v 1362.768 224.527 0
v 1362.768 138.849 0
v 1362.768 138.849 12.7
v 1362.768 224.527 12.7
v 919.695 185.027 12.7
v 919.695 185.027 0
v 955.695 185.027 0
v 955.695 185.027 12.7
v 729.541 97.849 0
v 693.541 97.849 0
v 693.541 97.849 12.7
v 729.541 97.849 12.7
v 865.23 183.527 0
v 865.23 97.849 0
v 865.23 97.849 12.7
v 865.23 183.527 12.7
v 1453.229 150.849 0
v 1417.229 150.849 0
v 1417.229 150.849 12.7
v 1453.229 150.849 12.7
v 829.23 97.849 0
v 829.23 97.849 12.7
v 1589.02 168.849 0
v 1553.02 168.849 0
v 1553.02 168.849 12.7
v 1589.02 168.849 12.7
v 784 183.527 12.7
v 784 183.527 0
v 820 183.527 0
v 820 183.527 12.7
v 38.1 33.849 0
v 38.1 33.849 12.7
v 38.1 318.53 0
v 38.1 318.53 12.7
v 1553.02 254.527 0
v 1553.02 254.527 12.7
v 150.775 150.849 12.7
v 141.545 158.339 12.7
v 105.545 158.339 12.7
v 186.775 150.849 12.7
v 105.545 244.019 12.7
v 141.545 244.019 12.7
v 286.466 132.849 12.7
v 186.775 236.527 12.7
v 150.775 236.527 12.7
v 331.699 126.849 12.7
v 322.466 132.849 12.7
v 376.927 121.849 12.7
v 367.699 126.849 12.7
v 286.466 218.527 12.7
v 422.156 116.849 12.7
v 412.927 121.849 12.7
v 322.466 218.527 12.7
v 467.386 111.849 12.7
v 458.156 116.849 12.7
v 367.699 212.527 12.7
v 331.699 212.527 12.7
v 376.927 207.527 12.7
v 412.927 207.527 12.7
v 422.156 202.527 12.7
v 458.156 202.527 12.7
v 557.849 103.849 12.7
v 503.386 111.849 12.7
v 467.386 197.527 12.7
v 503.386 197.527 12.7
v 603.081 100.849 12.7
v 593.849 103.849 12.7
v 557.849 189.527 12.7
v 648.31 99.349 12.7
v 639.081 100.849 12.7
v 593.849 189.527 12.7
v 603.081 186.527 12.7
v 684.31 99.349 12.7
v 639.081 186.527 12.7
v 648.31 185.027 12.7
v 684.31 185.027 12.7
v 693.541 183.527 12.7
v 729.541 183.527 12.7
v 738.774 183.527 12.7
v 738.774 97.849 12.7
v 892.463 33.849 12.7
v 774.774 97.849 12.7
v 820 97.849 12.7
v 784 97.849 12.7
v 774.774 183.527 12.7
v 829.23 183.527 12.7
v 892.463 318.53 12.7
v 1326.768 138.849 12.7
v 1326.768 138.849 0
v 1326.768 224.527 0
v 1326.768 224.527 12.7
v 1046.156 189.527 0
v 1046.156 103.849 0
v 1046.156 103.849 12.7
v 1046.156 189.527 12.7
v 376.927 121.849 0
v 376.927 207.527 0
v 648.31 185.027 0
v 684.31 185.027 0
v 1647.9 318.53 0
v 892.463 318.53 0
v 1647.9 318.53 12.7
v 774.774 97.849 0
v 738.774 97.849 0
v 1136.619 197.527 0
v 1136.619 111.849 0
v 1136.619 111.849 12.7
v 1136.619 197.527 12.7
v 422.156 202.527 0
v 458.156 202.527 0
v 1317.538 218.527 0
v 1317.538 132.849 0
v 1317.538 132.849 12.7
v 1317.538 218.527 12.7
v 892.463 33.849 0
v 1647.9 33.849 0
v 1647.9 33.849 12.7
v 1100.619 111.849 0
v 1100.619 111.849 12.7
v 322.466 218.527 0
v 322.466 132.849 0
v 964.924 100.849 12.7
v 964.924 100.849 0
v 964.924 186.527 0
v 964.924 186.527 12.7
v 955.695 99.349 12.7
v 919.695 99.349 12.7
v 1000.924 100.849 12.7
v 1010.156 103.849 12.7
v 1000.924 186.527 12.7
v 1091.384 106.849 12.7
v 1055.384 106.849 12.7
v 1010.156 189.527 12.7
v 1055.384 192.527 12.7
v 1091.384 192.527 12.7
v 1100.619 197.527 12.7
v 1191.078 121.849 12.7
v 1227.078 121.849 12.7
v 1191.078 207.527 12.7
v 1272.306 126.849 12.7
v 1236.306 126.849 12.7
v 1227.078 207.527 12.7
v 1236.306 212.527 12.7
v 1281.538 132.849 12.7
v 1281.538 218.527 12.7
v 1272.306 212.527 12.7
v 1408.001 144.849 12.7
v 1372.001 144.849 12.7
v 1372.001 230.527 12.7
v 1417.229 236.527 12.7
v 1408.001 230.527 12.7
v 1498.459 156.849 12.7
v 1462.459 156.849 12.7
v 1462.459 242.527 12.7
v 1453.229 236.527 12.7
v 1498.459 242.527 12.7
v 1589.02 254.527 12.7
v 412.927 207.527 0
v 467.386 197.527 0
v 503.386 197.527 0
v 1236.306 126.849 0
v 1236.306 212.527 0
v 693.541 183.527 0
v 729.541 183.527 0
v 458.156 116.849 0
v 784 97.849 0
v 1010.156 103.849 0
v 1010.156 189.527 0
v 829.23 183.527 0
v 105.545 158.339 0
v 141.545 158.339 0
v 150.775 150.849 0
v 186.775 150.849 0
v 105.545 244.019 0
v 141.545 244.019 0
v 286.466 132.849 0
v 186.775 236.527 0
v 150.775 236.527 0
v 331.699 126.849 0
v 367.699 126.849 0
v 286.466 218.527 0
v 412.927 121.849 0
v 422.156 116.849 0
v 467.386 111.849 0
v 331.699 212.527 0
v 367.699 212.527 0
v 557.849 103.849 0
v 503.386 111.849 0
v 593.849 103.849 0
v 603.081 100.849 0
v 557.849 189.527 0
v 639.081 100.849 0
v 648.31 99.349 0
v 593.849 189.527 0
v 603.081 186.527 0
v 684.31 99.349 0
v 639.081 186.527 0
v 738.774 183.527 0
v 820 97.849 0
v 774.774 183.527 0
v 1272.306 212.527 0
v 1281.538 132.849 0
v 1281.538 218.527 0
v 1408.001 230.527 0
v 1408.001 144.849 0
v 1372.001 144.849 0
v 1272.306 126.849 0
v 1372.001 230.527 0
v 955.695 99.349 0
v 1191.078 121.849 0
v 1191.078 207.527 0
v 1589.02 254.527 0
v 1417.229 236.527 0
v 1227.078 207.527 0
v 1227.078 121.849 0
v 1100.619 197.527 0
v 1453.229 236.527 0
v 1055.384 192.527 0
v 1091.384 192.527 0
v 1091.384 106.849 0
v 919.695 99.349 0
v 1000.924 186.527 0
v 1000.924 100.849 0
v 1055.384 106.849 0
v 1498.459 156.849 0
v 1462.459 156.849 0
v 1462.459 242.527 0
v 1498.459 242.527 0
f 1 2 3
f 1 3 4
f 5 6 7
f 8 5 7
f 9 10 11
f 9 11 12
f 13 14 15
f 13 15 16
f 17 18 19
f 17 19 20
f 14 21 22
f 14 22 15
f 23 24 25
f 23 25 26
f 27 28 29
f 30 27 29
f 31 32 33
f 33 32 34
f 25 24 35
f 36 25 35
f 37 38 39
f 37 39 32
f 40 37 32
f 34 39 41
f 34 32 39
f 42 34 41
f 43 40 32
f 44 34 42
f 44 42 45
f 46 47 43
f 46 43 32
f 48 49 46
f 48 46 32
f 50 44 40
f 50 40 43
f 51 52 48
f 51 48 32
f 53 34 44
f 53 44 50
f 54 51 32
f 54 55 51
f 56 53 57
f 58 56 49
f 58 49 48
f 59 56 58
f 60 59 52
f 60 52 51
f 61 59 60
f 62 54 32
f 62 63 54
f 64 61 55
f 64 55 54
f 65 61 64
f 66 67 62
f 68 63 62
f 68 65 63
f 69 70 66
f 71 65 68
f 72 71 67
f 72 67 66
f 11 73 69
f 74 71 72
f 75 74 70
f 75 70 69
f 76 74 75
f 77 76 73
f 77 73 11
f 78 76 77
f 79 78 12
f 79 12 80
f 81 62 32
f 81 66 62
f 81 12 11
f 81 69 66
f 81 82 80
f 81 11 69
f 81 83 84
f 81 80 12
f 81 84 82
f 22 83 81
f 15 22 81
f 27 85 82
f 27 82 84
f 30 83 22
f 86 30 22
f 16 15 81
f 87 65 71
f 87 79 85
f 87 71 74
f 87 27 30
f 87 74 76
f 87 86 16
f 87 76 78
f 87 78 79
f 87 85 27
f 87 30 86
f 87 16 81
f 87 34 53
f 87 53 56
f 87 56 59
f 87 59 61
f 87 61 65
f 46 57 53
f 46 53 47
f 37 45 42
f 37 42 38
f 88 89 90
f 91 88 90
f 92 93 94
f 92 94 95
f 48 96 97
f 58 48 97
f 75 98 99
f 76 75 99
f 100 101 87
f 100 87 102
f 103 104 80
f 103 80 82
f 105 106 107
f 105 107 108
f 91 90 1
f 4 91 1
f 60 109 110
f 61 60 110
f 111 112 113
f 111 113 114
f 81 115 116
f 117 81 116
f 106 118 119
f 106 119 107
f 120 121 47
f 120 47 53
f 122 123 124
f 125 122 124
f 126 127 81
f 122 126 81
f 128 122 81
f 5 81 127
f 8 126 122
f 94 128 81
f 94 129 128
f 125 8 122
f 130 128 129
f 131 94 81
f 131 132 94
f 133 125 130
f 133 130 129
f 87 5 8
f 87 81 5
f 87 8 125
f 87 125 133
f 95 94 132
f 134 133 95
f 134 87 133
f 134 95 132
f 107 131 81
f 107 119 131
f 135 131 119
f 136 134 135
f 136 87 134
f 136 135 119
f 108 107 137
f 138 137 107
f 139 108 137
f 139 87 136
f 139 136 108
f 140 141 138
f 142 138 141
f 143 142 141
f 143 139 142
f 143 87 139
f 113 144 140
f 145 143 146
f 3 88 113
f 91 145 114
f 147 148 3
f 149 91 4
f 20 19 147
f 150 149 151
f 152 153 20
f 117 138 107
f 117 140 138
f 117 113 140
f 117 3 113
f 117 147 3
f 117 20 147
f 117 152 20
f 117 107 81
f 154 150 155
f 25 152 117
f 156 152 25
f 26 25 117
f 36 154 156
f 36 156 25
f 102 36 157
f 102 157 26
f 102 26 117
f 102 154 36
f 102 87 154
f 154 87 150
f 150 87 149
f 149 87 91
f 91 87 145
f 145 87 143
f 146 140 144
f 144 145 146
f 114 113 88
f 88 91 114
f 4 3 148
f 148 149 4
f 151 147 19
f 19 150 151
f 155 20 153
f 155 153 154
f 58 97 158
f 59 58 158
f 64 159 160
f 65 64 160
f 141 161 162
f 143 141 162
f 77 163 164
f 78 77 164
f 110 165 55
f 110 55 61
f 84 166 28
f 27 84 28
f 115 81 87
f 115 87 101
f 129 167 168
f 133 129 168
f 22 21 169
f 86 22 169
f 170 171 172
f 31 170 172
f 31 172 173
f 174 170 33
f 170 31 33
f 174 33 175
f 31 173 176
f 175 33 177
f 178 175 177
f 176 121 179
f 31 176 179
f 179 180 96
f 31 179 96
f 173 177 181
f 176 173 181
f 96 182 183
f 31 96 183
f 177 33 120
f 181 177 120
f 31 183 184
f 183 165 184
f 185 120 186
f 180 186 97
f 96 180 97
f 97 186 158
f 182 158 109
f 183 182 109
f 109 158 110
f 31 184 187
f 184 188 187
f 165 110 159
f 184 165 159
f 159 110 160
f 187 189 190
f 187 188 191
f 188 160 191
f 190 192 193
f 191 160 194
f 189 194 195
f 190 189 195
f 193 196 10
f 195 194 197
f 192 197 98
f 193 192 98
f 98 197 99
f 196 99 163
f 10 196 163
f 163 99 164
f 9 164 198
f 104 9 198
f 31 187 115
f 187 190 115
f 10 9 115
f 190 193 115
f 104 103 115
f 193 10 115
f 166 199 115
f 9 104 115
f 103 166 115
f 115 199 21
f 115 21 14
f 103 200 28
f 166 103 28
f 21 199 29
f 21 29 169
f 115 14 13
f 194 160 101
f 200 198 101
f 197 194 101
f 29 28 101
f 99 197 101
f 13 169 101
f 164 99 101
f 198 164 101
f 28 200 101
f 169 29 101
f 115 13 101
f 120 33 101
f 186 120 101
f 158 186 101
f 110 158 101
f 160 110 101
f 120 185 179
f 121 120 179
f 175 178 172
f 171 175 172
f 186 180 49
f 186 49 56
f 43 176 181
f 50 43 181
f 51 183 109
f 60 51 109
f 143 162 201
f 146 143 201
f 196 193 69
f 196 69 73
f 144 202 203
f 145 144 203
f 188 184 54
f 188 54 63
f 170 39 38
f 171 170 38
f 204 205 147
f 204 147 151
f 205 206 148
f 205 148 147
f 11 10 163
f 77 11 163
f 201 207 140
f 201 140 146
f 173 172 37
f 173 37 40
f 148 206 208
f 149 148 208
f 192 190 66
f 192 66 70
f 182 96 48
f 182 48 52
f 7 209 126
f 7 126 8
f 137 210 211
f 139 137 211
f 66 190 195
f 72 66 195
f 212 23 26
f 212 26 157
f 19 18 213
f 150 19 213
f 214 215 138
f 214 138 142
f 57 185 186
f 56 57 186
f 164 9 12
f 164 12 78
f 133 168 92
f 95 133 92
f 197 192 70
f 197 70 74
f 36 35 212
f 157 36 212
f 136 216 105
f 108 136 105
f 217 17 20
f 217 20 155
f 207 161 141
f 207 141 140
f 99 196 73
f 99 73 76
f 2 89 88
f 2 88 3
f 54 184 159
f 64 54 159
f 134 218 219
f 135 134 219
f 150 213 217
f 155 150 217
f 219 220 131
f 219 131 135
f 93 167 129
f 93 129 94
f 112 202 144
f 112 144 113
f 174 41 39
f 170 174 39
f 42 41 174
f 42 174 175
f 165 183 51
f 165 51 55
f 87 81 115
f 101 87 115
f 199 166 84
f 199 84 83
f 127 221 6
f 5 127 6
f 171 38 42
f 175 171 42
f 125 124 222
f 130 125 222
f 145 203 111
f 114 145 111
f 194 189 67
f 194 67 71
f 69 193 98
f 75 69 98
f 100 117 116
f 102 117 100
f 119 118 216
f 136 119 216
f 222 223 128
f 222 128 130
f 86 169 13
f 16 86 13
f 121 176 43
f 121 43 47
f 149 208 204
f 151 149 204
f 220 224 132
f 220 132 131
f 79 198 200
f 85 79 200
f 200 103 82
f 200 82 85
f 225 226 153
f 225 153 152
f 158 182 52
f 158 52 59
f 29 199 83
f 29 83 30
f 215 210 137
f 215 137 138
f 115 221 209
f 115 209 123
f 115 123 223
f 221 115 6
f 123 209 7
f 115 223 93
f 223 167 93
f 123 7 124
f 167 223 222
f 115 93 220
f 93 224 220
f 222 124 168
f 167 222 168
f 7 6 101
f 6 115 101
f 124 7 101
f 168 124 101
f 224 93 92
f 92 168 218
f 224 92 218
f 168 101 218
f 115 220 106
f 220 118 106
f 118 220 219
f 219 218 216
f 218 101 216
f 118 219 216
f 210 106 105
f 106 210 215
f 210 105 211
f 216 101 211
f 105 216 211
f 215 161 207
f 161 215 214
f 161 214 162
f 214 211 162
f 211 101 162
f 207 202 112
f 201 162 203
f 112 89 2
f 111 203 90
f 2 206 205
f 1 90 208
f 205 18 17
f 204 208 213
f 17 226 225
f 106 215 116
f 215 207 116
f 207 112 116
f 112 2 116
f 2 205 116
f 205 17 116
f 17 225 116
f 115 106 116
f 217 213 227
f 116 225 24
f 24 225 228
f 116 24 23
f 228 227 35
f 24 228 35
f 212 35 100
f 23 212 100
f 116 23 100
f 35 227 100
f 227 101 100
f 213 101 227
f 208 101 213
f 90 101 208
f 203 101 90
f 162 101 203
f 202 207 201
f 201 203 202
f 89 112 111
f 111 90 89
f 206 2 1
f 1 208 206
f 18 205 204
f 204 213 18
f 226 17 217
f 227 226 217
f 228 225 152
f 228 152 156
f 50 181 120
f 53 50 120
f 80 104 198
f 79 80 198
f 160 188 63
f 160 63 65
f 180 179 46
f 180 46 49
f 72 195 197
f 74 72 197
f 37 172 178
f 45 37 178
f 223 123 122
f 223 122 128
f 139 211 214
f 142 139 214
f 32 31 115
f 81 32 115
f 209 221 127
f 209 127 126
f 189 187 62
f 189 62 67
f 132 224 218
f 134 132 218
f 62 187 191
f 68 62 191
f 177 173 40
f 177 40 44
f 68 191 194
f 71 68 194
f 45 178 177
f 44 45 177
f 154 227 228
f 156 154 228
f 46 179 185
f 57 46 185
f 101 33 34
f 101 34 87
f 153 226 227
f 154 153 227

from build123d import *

# Parameters (mm, degrees)
SKETCH2_W           = 1647.9
SKETCH2_H           = 284.681734848
SKETCH2_W_2         = 36
SKETCH2_H_2         = 85.677465121
BOSS_EXTRUDE1_DEPTH = 12.7
SKETCH3_W           = 19.05
SKETCH3_H           = 284.681734848
CUT_EXTRUDE1_DEPTH  = 13.7
SKETCH4_W           = 36
SKETCH4_H           = 50.330449982
SKETCH4_H_2         = 35.349550018
CUT_EXTRUDE2_DEPTH  = 13.7


with BuildPart() as part:
    # Sketch2 → Boss-Extrude1 (new body)
    with BuildSketch(Plane.XY):
        with Locations((842.999943303, 176.189566708)):
            Rectangle(SKETCH2_W, SKETCH2_H)
        with Locations((1571.01994314, 211.688120447)):
            Rectangle(SKETCH2_W_2, SKETCH2_H_2, mode=Mode.SUBTRACT)
        with Locations((1480.459247559, 199.688120447)):
            Rectangle(SKETCH2_W_2, SKETCH2_H_2, mode=Mode.SUBTRACT)
        with Locations((1435.229386921, 193.688120447)):
            Rectangle(SKETCH2_W_2, SKETCH2_H_2, mode=Mode.SUBTRACT)
        with Locations((1390.000695887, 187.688120447)):
            Rectangle(SKETCH2_W_2, SKETCH2_H_2, mode=Mode.SUBTRACT)
        with Locations((1344.768303255, 181.688120447)):
            Rectangle(SKETCH2_W_2, SKETCH2_H_2, mode=Mode.SUBTRACT)
        with Locations((1299.538396377, 175.688120447)):
            Rectangle(SKETCH2_W_2, SKETCH2_H_2, mode=Mode.SUBTRACT)
        with Locations((1254.306140471, 169.688120446)):
            Rectangle(SKETCH2_W_2, SKETCH2_H_2, mode=Mode.SUBTRACT)
        with Locations((1209.07770281, 164.688120446)):
            Rectangle(SKETCH2_W_2, SKETCH2_H_2, mode=Mode.SUBTRACT)
        with Locations((1118.618578512, 154.688120446)):
            Rectangle(SKETCH2_W_2, SKETCH2_H_2, mode=Mode.SUBTRACT)
        with Locations((1073.383844827, 149.688120446)):
            Rectangle(SKETCH2_W_2, SKETCH2_H_2, mode=Mode.SUBTRACT)
        with Locations((1028.155686863, 146.688120446)):
            Rectangle(SKETCH2_W_2, SKETCH2_H_2, mode=Mode.SUBTRACT)
        with Locations((982.9239215, 143.688120446)):
            Rectangle(SKETCH2_W_2, SKETCH2_H_2, mode=Mode.SUBTRACT)
        with Locations((937.694704034, 142.188120446)):
            Rectangle(SKETCH2_W_2, SKETCH2_H_2, mode=Mode.SUBTRACT)
        with Locations((847.230489128, 140.688120446)):
            Rectangle(SKETCH2_W_2, SKETCH2_H_2, mode=Mode.SUBTRACT)
        with Locations((801.999943303, 140.688120446)):
            Rectangle(SKETCH2_W_2, SKETCH2_H_2, mode=Mode.SUBTRACT)
        with Locations((756.774236257, 140.688120446)):
            Rectangle(SKETCH2_W_2, SKETCH2_H_2, mode=Mode.SUBTRACT)
        with Locations((711.541406556, 140.688120446)):
            Rectangle(SKETCH2_W_2, SKETCH2_H_2, mode=Mode.SUBTRACT)
        with Locations((666.310021351, 142.188120446)):
            Rectangle(SKETCH2_W_2, SKETCH2_H_2, mode=Mode.SUBTRACT)
        with Locations((621.080803885, 143.688120446)):
            Rectangle(SKETCH2_W_2, SKETCH2_H_2, mode=Mode.SUBTRACT)
        with Locations((575.849038522, 146.688120446)):
            Rectangle(SKETCH2_W_2, SKETCH2_H_2, mode=Mode.SUBTRACT)
        with Locations((485.386146872, 154.688120446)):
            Rectangle(SKETCH2_W_2, SKETCH2_H_2, mode=Mode.SUBTRACT)
        with Locations((304.466329007, 175.688120447)):
            Rectangle(SKETCH2_W_2, SKETCH2_H_2, mode=Mode.SUBTRACT)
        with Locations((440.15644292, 159.688120446)):
            Rectangle(SKETCH2_W_2, SKETCH2_H_2, mode=Mode.SUBTRACT)
        with Locations((394.927022575, 164.688120446)):
            Rectangle(SKETCH2_W_2, SKETCH2_H_2, mode=Mode.SUBTRACT)
        with Locations((349.698584914, 169.688120446)):
            Rectangle(SKETCH2_W_2, SKETCH2_H_2, mode=Mode.SUBTRACT)
        with Locations((168.775338464, 193.688120447)):
            Rectangle(SKETCH2_W_2, SKETCH2_H_2, mode=Mode.SUBTRACT)
    extrude(amount=BOSS_EXTRUDE1_DEPTH)

    # Sketch3 → Cut-Extrude1 (cut, through all)
    with BuildSketch(Plane.XY.offset(12.7)):
        with Locations((1657.424943303, 176.189566708)):
            Rectangle(SKETCH3_W, SKETCH3_H)
        with Locations((28.574943303, 176.189566708)):
            Rectangle(SKETCH3_W, SKETCH3_H)
    extrude(amount=-CUT_EXTRUDE1_DEPTH, mode=Mode.SUBTRACT)

    # Sketch4 → Cut-Extrude2 (cut, through all)
    with BuildSketch(Plane.XY.offset(12.7)):
        with Locations((123.545338464, 218.853345438)):
            Rectangle(SKETCH4_W, SKETCH4_H)
        with Locations((123.545338464, 176.013345438)):
            Rectangle(SKETCH4_W, SKETCH4_H_2)
    extrude(amount=-CUT_EXTRUDE2_DEPTH, mode=Mode.SUBTRACT)


with BuildPart() as body_2:
    # Split1: the piece on the far side of the plane
    add(part.part)
    split(bisect_by=Plane(origin=(892.462596581, 0, 0), x_dir=(0, 0, -1), z_dir=(-1, 0, 0)), keep=Keep.BOTTOM)


with BuildPart() as part_1:
    add(part.part)

    # Split1
    split(bisect_by=Plane(origin=(892.462596581, 0, 0), x_dir=(0, 0, -1), z_dir=(-1, 0, 0)), keep=Keep.TOP)


solid = Compound([body_2.part, part_1.part])
